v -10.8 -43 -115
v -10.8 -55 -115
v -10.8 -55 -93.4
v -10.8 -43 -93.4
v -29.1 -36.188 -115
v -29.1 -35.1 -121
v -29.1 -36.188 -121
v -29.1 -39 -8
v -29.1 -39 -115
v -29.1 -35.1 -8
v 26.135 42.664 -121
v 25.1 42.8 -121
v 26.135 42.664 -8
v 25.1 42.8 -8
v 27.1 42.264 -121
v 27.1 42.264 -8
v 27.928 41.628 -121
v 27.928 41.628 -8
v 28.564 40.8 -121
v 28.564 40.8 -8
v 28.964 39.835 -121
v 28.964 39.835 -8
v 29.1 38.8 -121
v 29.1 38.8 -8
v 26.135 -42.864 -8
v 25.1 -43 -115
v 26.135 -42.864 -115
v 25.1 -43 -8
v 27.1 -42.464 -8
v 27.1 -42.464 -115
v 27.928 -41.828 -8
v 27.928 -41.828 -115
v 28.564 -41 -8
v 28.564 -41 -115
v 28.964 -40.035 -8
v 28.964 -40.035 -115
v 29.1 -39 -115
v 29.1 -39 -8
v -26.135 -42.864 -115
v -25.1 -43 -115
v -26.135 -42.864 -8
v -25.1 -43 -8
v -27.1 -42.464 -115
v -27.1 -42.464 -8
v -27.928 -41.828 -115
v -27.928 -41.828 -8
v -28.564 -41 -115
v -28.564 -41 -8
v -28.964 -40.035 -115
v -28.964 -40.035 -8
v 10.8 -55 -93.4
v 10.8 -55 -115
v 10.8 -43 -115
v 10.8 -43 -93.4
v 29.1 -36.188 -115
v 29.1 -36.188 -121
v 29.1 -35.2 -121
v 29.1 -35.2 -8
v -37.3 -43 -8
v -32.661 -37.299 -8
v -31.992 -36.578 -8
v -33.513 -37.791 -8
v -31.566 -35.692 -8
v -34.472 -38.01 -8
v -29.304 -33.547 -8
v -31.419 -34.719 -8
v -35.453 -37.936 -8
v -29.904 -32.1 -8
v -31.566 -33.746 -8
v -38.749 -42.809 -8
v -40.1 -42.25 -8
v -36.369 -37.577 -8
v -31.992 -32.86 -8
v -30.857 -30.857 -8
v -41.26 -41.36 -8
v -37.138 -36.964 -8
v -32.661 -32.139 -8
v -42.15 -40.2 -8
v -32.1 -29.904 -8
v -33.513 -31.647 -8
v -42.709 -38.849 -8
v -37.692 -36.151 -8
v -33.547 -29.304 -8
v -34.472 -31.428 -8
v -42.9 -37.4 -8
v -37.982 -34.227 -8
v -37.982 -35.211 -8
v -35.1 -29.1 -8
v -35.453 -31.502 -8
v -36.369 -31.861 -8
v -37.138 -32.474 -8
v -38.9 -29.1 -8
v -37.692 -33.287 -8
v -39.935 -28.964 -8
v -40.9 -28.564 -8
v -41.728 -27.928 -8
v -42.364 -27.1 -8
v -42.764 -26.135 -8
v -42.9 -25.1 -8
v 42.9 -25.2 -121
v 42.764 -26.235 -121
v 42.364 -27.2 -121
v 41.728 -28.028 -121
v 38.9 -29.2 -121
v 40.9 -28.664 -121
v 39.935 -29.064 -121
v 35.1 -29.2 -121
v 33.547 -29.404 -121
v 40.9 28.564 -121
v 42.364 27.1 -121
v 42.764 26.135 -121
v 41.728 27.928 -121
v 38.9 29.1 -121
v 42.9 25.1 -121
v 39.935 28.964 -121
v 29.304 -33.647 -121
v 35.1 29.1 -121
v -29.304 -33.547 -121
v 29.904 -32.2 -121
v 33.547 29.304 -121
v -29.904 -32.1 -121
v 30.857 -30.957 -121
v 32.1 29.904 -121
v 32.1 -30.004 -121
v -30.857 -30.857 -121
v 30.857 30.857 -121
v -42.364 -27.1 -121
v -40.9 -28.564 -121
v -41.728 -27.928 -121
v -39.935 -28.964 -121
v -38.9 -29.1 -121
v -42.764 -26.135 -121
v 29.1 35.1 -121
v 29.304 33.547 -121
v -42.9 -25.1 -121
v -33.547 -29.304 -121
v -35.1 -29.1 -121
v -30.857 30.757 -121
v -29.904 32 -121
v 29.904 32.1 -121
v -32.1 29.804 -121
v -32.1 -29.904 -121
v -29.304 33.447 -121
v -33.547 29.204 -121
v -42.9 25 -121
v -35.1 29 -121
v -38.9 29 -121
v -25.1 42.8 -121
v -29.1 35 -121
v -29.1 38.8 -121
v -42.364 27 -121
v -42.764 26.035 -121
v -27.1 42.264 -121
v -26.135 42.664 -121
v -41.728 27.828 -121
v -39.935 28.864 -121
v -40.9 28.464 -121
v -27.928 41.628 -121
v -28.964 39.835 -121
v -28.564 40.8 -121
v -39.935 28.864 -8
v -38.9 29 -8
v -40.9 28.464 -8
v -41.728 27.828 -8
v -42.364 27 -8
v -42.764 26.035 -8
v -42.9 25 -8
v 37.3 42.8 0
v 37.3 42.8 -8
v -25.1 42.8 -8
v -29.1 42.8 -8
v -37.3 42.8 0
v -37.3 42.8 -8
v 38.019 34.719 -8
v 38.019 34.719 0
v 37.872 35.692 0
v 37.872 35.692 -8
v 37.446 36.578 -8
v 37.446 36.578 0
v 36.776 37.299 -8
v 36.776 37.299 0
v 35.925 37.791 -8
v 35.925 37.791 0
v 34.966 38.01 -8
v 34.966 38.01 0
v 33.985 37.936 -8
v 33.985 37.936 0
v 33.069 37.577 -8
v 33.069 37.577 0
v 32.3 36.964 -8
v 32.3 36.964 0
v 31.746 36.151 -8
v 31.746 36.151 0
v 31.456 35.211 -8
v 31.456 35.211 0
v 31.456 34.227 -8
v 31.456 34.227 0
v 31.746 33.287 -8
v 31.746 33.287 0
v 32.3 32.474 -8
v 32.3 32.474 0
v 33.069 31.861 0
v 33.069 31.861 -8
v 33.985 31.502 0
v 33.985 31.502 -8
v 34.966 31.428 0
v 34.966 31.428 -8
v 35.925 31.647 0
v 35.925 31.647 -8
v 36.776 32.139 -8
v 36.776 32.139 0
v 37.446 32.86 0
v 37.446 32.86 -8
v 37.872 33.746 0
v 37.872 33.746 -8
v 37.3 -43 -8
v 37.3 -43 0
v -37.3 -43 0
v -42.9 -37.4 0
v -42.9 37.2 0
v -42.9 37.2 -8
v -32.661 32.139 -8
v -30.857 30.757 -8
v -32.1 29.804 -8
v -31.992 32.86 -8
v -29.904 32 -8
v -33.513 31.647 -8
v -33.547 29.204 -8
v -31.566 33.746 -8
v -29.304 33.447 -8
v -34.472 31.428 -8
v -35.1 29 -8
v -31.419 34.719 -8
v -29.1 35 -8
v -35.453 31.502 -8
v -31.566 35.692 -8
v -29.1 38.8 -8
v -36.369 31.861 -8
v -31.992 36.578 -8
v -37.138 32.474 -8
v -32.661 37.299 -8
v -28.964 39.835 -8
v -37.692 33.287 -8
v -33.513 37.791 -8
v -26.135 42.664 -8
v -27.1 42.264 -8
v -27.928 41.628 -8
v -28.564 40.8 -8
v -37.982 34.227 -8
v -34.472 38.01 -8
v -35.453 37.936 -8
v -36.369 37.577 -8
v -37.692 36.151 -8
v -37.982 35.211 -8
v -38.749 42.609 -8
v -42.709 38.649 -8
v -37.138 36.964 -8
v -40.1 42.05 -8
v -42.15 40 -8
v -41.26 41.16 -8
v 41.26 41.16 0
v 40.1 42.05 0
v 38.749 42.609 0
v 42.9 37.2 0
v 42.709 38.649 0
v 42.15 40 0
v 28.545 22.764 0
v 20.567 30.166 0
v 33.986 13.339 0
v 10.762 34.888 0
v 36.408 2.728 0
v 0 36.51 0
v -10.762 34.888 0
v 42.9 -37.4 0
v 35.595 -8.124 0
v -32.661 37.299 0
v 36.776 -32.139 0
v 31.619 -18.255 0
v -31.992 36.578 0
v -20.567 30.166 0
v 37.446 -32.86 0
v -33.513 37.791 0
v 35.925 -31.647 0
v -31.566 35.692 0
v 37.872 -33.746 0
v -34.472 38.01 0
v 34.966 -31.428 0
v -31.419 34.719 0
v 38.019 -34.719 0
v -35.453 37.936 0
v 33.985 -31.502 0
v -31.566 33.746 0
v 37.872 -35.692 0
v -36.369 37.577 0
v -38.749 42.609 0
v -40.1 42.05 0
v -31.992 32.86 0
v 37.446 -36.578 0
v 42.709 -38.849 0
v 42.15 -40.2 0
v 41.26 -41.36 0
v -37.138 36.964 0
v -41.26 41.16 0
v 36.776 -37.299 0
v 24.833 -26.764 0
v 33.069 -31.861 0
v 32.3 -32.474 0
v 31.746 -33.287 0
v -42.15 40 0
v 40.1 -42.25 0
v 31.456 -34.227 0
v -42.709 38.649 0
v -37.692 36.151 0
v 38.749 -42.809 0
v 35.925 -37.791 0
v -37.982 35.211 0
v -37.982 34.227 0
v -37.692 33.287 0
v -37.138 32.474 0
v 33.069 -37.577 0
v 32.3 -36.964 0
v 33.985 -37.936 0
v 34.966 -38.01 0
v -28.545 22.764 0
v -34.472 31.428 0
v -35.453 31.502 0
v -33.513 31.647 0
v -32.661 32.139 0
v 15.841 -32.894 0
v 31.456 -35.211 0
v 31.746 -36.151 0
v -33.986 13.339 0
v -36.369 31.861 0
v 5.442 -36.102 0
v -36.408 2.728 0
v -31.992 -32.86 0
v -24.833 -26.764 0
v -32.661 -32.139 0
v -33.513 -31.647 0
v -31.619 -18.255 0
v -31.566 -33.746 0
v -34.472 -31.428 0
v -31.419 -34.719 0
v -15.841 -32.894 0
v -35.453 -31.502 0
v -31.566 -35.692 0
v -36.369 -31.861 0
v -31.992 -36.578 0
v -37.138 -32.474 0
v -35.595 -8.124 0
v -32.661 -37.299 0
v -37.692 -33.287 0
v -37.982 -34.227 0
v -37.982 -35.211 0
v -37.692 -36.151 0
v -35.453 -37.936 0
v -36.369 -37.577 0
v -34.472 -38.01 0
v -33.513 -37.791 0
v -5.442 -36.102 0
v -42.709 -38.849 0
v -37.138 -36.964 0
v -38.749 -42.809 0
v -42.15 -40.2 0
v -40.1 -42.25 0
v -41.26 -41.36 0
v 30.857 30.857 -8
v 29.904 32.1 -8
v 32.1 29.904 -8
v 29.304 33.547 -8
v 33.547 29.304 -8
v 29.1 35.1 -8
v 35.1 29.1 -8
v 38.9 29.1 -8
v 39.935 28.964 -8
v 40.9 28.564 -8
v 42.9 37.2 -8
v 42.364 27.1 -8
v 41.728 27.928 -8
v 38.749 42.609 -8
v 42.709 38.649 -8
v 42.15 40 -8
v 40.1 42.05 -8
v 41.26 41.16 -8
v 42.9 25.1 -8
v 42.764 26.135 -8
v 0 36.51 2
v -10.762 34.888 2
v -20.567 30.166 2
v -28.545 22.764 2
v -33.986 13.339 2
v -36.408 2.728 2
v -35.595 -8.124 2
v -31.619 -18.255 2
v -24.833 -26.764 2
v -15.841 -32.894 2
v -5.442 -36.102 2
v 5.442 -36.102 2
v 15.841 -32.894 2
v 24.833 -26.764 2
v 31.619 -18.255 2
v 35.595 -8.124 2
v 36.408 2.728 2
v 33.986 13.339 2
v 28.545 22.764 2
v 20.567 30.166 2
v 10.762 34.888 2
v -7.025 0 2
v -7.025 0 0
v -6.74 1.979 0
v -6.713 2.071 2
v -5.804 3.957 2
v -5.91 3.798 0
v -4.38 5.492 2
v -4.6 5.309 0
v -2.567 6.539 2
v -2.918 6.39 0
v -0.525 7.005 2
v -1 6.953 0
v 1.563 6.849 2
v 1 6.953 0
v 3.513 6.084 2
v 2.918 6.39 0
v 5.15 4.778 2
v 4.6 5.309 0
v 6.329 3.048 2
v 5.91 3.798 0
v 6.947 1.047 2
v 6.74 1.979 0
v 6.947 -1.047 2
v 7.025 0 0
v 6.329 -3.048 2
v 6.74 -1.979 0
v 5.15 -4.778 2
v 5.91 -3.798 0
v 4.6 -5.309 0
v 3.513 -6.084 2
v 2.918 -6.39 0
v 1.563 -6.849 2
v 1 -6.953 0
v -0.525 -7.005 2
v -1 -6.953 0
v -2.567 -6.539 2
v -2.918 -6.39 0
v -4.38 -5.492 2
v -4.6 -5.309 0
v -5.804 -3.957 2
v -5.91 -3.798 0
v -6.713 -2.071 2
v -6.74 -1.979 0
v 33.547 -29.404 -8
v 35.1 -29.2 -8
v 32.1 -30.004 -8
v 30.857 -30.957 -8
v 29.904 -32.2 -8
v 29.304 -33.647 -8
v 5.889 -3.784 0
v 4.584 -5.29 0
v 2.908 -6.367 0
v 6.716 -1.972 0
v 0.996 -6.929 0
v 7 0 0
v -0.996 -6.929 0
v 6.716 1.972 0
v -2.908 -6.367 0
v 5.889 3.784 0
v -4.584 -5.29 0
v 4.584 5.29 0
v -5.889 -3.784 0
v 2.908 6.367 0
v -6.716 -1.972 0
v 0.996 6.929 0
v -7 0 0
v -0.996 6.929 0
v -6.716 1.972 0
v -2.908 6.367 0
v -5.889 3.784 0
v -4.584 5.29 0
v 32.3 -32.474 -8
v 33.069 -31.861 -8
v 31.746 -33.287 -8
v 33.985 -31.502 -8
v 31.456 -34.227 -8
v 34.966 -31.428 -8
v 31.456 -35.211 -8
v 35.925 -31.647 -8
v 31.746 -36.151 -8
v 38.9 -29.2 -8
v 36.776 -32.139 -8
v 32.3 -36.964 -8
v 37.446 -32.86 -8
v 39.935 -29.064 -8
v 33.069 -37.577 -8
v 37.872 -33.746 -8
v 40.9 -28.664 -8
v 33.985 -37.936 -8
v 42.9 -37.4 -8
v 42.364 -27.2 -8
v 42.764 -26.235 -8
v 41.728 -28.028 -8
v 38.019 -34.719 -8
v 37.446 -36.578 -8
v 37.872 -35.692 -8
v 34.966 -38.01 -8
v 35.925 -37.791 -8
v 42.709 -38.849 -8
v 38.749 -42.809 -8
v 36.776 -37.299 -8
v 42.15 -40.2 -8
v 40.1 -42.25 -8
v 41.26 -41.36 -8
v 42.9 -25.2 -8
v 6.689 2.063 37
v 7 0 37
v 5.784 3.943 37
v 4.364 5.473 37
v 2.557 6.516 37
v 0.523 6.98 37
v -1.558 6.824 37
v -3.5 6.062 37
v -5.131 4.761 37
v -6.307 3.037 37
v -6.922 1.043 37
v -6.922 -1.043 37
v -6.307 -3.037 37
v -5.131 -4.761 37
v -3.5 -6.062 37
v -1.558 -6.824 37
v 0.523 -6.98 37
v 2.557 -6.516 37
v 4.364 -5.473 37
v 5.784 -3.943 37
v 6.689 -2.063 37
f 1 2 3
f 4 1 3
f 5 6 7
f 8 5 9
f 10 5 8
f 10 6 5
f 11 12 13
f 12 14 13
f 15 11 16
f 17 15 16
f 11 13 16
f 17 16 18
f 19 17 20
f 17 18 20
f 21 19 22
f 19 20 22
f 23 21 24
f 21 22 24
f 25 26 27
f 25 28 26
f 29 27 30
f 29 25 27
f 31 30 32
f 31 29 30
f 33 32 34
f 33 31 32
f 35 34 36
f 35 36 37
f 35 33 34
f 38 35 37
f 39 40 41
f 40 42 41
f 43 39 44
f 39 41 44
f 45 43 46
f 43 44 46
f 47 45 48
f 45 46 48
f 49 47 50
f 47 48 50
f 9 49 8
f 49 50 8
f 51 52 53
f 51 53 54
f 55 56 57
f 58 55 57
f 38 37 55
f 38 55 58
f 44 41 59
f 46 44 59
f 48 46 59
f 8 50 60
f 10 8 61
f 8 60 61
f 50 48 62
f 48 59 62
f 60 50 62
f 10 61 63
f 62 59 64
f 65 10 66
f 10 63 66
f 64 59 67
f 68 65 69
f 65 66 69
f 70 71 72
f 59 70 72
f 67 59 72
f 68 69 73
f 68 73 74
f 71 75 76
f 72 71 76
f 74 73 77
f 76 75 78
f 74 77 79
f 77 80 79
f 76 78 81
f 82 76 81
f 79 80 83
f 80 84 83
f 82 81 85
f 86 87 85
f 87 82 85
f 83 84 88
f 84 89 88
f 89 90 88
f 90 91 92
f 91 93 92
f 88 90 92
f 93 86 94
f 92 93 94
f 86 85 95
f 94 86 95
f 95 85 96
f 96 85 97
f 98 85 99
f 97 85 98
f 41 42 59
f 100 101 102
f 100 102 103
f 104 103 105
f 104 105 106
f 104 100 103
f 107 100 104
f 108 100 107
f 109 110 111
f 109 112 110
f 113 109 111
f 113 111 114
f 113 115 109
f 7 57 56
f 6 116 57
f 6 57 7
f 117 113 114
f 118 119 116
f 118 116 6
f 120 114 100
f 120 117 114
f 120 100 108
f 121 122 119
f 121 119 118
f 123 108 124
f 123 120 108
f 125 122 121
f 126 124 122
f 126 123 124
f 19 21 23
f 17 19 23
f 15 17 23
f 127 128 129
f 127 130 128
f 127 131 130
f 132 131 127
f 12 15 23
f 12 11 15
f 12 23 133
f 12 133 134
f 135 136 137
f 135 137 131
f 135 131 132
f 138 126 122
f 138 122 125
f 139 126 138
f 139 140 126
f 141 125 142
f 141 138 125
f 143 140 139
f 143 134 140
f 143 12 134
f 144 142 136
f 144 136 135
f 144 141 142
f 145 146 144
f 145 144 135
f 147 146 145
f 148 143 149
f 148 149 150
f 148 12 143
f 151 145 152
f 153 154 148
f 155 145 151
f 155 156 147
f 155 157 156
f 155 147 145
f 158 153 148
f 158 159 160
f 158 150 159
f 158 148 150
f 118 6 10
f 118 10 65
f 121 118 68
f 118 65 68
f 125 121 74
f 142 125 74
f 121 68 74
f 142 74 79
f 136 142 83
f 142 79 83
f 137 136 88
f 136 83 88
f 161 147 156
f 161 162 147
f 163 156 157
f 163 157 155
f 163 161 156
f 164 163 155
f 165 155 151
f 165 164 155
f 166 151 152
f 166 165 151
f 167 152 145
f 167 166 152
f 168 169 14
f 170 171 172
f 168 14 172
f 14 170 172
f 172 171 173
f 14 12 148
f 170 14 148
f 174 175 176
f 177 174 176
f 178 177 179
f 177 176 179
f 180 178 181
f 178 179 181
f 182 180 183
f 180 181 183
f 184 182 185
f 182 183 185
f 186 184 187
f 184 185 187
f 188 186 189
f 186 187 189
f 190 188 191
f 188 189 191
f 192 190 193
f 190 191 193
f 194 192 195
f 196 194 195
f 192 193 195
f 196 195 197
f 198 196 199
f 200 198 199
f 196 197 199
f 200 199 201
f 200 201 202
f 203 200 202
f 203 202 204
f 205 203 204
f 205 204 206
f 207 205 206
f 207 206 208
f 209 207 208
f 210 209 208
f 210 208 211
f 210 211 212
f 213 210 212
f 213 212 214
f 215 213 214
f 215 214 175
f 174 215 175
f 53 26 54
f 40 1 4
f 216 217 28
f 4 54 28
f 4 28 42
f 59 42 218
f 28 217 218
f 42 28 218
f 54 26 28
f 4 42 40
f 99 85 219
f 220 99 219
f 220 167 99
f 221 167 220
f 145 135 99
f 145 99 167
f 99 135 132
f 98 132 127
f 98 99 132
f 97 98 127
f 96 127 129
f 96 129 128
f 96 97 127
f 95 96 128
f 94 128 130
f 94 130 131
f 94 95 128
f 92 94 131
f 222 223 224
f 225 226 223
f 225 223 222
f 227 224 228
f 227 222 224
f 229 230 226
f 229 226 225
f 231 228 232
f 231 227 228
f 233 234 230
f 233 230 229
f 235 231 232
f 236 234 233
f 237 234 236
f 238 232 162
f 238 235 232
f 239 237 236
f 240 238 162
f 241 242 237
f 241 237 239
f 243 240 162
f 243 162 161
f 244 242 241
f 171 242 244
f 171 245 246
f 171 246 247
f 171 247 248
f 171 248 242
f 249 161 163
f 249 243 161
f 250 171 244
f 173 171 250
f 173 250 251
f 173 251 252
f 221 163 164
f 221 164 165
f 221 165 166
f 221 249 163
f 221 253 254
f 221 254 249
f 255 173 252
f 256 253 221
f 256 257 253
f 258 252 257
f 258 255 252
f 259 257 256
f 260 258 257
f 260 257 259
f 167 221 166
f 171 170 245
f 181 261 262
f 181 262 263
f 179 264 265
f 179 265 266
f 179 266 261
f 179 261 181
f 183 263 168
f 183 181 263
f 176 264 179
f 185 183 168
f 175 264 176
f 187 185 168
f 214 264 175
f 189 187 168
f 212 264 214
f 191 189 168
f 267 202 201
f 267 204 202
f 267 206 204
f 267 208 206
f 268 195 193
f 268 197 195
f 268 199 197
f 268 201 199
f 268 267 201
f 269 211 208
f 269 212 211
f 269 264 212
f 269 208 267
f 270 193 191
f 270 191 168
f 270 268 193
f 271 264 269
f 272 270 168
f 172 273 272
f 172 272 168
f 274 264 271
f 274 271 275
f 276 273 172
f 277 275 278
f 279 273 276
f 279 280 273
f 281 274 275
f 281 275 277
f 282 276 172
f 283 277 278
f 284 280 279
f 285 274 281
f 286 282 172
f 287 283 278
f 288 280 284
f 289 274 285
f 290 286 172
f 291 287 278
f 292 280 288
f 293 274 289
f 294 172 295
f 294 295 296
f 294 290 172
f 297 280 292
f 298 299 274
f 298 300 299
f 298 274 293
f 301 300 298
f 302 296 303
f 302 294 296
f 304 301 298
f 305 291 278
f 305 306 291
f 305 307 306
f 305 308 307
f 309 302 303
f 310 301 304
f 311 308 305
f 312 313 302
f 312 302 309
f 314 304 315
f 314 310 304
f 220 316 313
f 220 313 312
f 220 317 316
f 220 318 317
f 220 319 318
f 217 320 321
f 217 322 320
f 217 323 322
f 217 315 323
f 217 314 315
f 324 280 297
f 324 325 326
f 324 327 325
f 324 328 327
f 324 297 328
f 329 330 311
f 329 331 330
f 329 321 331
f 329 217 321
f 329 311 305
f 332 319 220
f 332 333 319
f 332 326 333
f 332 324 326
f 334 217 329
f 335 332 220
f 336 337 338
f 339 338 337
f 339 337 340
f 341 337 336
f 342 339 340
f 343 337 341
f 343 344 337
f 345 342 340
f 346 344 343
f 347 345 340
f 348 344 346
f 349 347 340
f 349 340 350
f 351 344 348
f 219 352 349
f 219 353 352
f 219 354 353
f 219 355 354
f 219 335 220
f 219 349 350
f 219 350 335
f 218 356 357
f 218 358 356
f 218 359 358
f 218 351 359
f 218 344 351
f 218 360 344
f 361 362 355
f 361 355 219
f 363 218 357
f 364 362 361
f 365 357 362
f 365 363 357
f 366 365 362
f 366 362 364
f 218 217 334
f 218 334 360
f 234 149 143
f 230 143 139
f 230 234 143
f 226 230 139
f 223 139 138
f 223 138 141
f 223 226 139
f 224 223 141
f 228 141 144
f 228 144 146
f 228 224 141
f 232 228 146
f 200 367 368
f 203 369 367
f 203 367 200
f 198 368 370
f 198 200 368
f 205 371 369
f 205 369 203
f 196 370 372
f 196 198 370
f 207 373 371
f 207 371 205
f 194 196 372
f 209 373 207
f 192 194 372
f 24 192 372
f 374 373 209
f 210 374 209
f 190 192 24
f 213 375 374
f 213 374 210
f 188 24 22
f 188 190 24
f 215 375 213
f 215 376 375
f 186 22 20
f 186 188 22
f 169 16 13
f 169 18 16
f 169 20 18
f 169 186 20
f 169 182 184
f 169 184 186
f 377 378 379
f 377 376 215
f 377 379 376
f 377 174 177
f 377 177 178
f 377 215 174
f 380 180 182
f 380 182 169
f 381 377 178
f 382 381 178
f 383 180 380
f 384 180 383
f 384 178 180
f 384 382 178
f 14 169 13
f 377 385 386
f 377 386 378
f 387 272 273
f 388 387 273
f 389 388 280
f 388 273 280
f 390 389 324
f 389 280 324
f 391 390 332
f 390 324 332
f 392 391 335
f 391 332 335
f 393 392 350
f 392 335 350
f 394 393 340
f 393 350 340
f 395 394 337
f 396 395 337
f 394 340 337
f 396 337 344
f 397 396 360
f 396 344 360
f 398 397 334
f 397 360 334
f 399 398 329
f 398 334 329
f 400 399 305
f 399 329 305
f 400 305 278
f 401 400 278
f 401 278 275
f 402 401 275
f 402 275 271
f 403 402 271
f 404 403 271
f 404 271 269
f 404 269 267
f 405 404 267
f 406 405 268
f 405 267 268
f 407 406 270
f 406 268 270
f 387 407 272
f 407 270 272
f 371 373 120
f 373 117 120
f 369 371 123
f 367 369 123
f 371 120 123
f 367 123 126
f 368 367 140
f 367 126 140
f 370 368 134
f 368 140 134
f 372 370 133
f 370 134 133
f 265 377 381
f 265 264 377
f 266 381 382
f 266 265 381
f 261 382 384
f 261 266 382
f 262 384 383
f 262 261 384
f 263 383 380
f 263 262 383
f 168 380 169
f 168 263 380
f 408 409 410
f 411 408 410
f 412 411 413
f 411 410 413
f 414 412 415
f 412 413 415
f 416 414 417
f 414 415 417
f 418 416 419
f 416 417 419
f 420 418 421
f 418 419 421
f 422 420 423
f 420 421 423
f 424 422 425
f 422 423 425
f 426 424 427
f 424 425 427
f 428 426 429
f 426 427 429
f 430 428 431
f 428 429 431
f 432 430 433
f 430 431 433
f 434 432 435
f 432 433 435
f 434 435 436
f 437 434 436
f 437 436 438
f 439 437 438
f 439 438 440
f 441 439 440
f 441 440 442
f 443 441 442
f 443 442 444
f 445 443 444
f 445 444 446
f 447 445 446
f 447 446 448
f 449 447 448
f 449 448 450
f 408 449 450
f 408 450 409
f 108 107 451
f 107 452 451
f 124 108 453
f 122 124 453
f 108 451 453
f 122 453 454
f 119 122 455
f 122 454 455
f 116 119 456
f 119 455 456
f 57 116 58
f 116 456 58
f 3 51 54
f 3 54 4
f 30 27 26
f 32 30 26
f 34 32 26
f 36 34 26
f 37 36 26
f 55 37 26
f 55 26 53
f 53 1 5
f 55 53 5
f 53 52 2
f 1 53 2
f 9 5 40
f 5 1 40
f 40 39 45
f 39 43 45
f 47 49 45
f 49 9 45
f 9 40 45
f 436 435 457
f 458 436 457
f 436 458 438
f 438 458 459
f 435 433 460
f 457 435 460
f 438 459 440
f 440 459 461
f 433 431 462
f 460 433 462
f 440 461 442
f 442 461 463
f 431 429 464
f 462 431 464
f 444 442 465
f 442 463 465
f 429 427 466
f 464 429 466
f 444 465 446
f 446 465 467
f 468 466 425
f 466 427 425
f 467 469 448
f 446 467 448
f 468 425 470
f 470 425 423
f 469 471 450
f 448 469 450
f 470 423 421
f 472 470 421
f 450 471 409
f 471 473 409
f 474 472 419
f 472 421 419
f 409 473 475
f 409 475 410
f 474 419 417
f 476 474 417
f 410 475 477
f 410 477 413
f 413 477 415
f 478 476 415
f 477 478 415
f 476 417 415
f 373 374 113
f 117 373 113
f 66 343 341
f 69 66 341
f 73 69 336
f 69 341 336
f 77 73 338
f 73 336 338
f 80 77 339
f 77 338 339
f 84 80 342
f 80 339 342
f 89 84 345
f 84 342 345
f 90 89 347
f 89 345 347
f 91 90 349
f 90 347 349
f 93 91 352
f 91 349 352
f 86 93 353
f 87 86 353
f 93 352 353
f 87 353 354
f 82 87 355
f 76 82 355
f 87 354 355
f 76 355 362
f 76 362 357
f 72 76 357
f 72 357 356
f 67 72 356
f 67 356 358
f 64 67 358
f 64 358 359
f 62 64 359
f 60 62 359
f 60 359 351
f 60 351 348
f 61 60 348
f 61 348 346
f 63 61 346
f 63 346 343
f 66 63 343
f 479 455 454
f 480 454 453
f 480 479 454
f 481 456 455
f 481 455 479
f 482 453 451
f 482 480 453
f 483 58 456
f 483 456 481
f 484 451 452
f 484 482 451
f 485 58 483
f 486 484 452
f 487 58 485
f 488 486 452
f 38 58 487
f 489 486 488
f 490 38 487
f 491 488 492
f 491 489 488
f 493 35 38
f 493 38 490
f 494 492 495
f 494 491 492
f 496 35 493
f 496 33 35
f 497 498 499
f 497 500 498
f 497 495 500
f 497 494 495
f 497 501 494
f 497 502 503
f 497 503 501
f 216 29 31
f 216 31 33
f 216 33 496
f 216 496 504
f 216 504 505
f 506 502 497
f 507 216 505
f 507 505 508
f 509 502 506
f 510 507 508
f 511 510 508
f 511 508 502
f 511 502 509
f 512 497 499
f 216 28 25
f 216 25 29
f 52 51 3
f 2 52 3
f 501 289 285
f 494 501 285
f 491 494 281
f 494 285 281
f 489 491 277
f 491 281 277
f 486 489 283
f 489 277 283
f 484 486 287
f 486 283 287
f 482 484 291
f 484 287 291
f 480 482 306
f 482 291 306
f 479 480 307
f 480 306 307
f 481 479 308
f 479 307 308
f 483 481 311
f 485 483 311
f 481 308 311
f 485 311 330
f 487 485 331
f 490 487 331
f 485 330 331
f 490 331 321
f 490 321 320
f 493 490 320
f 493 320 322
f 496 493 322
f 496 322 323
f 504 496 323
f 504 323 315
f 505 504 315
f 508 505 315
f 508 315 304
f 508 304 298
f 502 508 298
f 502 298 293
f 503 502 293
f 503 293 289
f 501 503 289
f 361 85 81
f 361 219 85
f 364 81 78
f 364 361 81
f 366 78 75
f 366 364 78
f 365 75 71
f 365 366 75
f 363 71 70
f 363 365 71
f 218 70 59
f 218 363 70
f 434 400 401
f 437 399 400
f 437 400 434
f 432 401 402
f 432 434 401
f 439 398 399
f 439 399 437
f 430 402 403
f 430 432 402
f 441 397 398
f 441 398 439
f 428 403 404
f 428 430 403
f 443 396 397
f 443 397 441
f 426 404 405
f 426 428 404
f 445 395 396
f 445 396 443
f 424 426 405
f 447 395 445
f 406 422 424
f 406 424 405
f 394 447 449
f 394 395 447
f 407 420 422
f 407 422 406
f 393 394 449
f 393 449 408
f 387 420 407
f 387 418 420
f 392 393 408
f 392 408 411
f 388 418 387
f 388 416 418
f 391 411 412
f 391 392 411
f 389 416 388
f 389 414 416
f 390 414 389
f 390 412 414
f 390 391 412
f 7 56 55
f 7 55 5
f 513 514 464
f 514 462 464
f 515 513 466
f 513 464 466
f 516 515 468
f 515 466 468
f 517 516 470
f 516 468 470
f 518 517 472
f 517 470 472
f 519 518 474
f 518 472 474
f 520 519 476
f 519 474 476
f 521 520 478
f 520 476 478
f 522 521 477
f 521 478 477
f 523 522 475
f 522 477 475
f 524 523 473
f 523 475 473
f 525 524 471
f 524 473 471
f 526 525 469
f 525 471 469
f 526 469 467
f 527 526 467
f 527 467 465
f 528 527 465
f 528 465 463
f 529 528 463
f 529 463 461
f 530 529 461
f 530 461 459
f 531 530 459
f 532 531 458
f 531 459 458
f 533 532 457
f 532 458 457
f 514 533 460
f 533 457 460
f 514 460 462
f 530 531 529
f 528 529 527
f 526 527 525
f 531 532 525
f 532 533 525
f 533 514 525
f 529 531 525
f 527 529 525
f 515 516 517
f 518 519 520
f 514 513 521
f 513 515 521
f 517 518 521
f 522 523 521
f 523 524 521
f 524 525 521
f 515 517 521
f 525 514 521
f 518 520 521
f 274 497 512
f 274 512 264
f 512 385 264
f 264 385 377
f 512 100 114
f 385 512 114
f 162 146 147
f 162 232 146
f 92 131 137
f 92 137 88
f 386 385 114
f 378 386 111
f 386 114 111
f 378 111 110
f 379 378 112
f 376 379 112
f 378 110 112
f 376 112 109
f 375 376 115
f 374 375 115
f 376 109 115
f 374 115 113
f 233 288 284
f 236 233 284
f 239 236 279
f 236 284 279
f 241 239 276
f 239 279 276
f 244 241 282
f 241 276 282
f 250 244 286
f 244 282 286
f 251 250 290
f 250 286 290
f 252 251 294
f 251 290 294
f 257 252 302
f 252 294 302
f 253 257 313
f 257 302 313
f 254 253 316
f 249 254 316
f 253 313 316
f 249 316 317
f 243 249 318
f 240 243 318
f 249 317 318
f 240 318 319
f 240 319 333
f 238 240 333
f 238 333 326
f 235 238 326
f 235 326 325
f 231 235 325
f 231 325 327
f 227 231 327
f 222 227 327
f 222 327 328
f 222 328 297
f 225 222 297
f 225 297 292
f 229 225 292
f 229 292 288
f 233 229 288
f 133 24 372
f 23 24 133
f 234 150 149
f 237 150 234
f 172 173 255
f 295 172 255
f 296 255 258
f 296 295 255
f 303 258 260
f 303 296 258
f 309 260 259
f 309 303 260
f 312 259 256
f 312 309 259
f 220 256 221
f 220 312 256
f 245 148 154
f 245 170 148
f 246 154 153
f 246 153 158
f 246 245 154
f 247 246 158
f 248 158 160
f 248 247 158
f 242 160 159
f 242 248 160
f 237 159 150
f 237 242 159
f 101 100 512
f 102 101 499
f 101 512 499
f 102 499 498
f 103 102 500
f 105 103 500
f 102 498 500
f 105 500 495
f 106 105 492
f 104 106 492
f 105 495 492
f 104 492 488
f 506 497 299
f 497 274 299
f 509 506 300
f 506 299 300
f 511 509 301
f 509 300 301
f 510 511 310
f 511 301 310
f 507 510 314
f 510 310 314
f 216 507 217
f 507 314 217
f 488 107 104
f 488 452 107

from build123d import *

# Parameters (mm, degrees)
SZKIC7_W                    = 21.6
SZKIC7_H                    = 21.6
DODANIE_WYCI_GNI_CIE5_DEPTH = 12
SZKIC8_W                    = 85.8
SZKIC8_H                    = 115
DODANIE_WYCI_GNI_CIE6_DEPTH = 85.8
SZKIC9_W                    = 85.8
SZKIC9_H                    = 78.988293657
DODANIE_WYCI_GNI_CIE7_DEPTH = 7
SZKIC10_W                   = 113
SZKIC10_H                   = 16.646355961
WYTNIJ_WYCI_GNI_CIE3_DEPTH  = 13.8
SZKIC11_W                   = 13.8
SZKIC11_H                   = 113
WYTNIJ_WYCI_GNI_CIE4_DEPTH  = 13.8
SZKIC12_W                   = 113
SZKIC12_H                   = 13.8
WYTNIJ_WYCI_GNI_CIE5_DEPTH  = 13.8
SZKIC13_W                   = 13.8
SZKIC13_H                   = 113
WYTNIJ_WYCI_GNI_CIE6_DEPTH  = 13.8
SZKIC14_R                   = 36.51
DODANIE_WYCI_GNI_CIE8_DEPTH = 2
OTW_R_POD_RUB_M121_D        = 14.05
OTW_R_POD_RUB_M121_DEPTH    = 2
SZKIC17_W                   = 7
SZKIC17_H                   = 37
OTW_R_6_6_6_6_1_D           = 6.6
OTW_R_6_6_6_6_1_DEPTH       = 45
ZAOKR_GLENIE1_R             = 4.000000016
ZAOKR_GLENIE2_R             = 5.6
ZAOKR_GLENIE3_R             = 5.99999999


with BuildPart() as part:
    # Szkic7 → Dodanie-wyciągnięcie5 (new body)
    with BuildSketch(Plane(origin=(0, -55, 0), x_dir=(-1, 0, 0), z_dir=(0, 1, 0))):
        with Locations((0, -104.2)):
            Rectangle(SZKIC7_W, SZKIC7_H)
    extrude(amount=DODANIE_WYCI_GNI_CIE5_DEPTH)

    # Szkic8 → Dodanie-wyciągnięcie6 (add)
    with BuildSketch(Plane(origin=(0, -43, 0), x_dir=(-1, 0, 0), z_dir=(0, 1, 0))):
        with Locations((0, -57.5)):
            Rectangle(SZKIC8_W, SZKIC8_H)
    extrude(amount=DODANIE_WYCI_GNI_CIE6_DEPTH)

    # Szkic9 → Dodanie-wyciągnięcie7 (add)
    with BuildSketch(Plane(origin=(0, 0, -121), x_dir=(-1, 0, 0), z_dir=(0, 0, -1))):
        with Locations((0, 3.305853172)):
            Rectangle(SZKIC9_W, SZKIC9_H)
    extrude(amount=-DODANIE_WYCI_GNI_CIE7_DEPTH)

    # Szkic10 → Wytnij-wyciągnięcie3 (cut)
    with BuildSketch(Plane.ZY.offset(42.9)):
        with Locations((-64.5, -37.423177981)):
            Rectangle(SZKIC10_W, SZKIC10_H)
    extrude(amount=-WYTNIJ_WYCI_GNI_CIE3_DEPTH, mode=Mode.SUBTRACT)

    # Szkic11 → Wytnij-wyciągnięcie4 (cut)
    with BuildSketch(Plane.XZ.offset(43)):
        with Locations((36, -64.5)):
            Rectangle(SZKIC11_W, SZKIC11_H)
    extrude(amount=-WYTNIJ_WYCI_GNI_CIE4_DEPTH, mode=Mode.SUBTRACT)

    # Szkic12 → Wytnij-wyciągnięcie5 (cut)
    with BuildSketch(Plane(origin=(42.9, 0, 0), x_dir=(0, 0, -1), z_dir=(1, 0, 0))):
        with Locations((64.5, 36)):
            Rectangle(SZKIC12_W, SZKIC12_H)
    extrude(amount=-WYTNIJ_WYCI_GNI_CIE5_DEPTH, mode=Mode.SUBTRACT)

    # Szkic13 → Wytnij-wyciągnięcie6 (cut)
    with BuildSketch(Plane(origin=(0, 42.8, 0), x_dir=(-1, 0, 0), z_dir=(0, 1, 0))):
        with Locations((36, -64.5)):
            Rectangle(SZKIC13_W, SZKIC13_H)
    extrude(amount=-WYTNIJ_WYCI_GNI_CIE6_DEPTH, mode=Mode.SUBTRACT)

    # Szkic14 → Dodanie-wyciągnięcie8 (add)
    with BuildSketch(Plane.XY):
        with Locations(Location((0, 0, 0), (0, 0, 90))):
            Circle(SZKIC14_R)
    extrude(amount=DODANIE_WYCI_GNI_CIE8_DEPTH)

    # Otwór pod śrubę M121
    with Locations(Plane.XY.offset(2)):
        with Locations((0, 0)):
            Hole(OTW_R_POD_RUB_M121_D / 2, depth=OTW_R_POD_RUB_M121_DEPTH)

    # Szkic17 → Obrót1 (revolve)
    with BuildSketch(Plane(origin=(0, 0, 0), x_dir=(1, 0, 0), z_dir=(0, 1, 0))):
        with Locations((3.5, -18.5)):
            Rectangle(SZKIC17_W, SZKIC17_H)
    revolve(axis=Axis((0, 0, 0), (0, 0, 1)))

    # Otwór Ø6.6 (6.6)1
    with Locations(Plane(origin=(0, 0, -8), x_dir=(-1, 0, 0), z_dir=(0, 0, -1))):
        with Locations((34.718942956, -34.718942956), (-34.718942956, -34.718942956), (-34.718942956, 34.718942956), (34.718942956, 34.718942956)):
            Hole(OTW_R_6_6_6_6_1_D / 2, depth=OTW_R_6_6_6_6_1_DEPTH)

    # Zaokrąglenie1
    zaokr_glenie1_edges = [part.edges().sort_by_distance(p)[0] for p in [
        (-42.9, 29, -64.5),
        (-29.1, 42.8, -64.5),
        (-29.1, -43, -61.5),
        (-42.9, -29.1, -64.5),
        (29.1, -43, -61.5),
        (42.9, -29.2, -64.5),
        (42.9, 29.1, -64.5),
        (29.1, 42.8, -64.5),
    ]]
    fillet(zaokr_glenie1_edges, radius=ZAOKR_GLENIE1_R)

    # Zaokrąglenie2
    zaokr_glenie2_edges = [part.edges().sort_by_distance(p)[0] for p in [
        (-42.9, 42.8, -4),
        (42.9, -43, -4),
        (42.9, 42.8, -4),
        (-42.9, -43, -4),
    ]]
    fillet(zaokr_glenie2_edges, radius=ZAOKR_GLENIE2_R)

    # Zaokrąglenie3
    zaokr_glenie3_edges = [part.edges().sort_by_distance(p)[0] for p in [
        (-29.1, 29, -64.5),
        (-29.1, -29.1, -64.5),
        (29.1, -29.2, -64.5),
        (29.1, 29.1, -64.5),
    ]]
    fillet(zaokr_glenie3_edges, radius=ZAOKR_GLENIE3_R)


solid = part.part
